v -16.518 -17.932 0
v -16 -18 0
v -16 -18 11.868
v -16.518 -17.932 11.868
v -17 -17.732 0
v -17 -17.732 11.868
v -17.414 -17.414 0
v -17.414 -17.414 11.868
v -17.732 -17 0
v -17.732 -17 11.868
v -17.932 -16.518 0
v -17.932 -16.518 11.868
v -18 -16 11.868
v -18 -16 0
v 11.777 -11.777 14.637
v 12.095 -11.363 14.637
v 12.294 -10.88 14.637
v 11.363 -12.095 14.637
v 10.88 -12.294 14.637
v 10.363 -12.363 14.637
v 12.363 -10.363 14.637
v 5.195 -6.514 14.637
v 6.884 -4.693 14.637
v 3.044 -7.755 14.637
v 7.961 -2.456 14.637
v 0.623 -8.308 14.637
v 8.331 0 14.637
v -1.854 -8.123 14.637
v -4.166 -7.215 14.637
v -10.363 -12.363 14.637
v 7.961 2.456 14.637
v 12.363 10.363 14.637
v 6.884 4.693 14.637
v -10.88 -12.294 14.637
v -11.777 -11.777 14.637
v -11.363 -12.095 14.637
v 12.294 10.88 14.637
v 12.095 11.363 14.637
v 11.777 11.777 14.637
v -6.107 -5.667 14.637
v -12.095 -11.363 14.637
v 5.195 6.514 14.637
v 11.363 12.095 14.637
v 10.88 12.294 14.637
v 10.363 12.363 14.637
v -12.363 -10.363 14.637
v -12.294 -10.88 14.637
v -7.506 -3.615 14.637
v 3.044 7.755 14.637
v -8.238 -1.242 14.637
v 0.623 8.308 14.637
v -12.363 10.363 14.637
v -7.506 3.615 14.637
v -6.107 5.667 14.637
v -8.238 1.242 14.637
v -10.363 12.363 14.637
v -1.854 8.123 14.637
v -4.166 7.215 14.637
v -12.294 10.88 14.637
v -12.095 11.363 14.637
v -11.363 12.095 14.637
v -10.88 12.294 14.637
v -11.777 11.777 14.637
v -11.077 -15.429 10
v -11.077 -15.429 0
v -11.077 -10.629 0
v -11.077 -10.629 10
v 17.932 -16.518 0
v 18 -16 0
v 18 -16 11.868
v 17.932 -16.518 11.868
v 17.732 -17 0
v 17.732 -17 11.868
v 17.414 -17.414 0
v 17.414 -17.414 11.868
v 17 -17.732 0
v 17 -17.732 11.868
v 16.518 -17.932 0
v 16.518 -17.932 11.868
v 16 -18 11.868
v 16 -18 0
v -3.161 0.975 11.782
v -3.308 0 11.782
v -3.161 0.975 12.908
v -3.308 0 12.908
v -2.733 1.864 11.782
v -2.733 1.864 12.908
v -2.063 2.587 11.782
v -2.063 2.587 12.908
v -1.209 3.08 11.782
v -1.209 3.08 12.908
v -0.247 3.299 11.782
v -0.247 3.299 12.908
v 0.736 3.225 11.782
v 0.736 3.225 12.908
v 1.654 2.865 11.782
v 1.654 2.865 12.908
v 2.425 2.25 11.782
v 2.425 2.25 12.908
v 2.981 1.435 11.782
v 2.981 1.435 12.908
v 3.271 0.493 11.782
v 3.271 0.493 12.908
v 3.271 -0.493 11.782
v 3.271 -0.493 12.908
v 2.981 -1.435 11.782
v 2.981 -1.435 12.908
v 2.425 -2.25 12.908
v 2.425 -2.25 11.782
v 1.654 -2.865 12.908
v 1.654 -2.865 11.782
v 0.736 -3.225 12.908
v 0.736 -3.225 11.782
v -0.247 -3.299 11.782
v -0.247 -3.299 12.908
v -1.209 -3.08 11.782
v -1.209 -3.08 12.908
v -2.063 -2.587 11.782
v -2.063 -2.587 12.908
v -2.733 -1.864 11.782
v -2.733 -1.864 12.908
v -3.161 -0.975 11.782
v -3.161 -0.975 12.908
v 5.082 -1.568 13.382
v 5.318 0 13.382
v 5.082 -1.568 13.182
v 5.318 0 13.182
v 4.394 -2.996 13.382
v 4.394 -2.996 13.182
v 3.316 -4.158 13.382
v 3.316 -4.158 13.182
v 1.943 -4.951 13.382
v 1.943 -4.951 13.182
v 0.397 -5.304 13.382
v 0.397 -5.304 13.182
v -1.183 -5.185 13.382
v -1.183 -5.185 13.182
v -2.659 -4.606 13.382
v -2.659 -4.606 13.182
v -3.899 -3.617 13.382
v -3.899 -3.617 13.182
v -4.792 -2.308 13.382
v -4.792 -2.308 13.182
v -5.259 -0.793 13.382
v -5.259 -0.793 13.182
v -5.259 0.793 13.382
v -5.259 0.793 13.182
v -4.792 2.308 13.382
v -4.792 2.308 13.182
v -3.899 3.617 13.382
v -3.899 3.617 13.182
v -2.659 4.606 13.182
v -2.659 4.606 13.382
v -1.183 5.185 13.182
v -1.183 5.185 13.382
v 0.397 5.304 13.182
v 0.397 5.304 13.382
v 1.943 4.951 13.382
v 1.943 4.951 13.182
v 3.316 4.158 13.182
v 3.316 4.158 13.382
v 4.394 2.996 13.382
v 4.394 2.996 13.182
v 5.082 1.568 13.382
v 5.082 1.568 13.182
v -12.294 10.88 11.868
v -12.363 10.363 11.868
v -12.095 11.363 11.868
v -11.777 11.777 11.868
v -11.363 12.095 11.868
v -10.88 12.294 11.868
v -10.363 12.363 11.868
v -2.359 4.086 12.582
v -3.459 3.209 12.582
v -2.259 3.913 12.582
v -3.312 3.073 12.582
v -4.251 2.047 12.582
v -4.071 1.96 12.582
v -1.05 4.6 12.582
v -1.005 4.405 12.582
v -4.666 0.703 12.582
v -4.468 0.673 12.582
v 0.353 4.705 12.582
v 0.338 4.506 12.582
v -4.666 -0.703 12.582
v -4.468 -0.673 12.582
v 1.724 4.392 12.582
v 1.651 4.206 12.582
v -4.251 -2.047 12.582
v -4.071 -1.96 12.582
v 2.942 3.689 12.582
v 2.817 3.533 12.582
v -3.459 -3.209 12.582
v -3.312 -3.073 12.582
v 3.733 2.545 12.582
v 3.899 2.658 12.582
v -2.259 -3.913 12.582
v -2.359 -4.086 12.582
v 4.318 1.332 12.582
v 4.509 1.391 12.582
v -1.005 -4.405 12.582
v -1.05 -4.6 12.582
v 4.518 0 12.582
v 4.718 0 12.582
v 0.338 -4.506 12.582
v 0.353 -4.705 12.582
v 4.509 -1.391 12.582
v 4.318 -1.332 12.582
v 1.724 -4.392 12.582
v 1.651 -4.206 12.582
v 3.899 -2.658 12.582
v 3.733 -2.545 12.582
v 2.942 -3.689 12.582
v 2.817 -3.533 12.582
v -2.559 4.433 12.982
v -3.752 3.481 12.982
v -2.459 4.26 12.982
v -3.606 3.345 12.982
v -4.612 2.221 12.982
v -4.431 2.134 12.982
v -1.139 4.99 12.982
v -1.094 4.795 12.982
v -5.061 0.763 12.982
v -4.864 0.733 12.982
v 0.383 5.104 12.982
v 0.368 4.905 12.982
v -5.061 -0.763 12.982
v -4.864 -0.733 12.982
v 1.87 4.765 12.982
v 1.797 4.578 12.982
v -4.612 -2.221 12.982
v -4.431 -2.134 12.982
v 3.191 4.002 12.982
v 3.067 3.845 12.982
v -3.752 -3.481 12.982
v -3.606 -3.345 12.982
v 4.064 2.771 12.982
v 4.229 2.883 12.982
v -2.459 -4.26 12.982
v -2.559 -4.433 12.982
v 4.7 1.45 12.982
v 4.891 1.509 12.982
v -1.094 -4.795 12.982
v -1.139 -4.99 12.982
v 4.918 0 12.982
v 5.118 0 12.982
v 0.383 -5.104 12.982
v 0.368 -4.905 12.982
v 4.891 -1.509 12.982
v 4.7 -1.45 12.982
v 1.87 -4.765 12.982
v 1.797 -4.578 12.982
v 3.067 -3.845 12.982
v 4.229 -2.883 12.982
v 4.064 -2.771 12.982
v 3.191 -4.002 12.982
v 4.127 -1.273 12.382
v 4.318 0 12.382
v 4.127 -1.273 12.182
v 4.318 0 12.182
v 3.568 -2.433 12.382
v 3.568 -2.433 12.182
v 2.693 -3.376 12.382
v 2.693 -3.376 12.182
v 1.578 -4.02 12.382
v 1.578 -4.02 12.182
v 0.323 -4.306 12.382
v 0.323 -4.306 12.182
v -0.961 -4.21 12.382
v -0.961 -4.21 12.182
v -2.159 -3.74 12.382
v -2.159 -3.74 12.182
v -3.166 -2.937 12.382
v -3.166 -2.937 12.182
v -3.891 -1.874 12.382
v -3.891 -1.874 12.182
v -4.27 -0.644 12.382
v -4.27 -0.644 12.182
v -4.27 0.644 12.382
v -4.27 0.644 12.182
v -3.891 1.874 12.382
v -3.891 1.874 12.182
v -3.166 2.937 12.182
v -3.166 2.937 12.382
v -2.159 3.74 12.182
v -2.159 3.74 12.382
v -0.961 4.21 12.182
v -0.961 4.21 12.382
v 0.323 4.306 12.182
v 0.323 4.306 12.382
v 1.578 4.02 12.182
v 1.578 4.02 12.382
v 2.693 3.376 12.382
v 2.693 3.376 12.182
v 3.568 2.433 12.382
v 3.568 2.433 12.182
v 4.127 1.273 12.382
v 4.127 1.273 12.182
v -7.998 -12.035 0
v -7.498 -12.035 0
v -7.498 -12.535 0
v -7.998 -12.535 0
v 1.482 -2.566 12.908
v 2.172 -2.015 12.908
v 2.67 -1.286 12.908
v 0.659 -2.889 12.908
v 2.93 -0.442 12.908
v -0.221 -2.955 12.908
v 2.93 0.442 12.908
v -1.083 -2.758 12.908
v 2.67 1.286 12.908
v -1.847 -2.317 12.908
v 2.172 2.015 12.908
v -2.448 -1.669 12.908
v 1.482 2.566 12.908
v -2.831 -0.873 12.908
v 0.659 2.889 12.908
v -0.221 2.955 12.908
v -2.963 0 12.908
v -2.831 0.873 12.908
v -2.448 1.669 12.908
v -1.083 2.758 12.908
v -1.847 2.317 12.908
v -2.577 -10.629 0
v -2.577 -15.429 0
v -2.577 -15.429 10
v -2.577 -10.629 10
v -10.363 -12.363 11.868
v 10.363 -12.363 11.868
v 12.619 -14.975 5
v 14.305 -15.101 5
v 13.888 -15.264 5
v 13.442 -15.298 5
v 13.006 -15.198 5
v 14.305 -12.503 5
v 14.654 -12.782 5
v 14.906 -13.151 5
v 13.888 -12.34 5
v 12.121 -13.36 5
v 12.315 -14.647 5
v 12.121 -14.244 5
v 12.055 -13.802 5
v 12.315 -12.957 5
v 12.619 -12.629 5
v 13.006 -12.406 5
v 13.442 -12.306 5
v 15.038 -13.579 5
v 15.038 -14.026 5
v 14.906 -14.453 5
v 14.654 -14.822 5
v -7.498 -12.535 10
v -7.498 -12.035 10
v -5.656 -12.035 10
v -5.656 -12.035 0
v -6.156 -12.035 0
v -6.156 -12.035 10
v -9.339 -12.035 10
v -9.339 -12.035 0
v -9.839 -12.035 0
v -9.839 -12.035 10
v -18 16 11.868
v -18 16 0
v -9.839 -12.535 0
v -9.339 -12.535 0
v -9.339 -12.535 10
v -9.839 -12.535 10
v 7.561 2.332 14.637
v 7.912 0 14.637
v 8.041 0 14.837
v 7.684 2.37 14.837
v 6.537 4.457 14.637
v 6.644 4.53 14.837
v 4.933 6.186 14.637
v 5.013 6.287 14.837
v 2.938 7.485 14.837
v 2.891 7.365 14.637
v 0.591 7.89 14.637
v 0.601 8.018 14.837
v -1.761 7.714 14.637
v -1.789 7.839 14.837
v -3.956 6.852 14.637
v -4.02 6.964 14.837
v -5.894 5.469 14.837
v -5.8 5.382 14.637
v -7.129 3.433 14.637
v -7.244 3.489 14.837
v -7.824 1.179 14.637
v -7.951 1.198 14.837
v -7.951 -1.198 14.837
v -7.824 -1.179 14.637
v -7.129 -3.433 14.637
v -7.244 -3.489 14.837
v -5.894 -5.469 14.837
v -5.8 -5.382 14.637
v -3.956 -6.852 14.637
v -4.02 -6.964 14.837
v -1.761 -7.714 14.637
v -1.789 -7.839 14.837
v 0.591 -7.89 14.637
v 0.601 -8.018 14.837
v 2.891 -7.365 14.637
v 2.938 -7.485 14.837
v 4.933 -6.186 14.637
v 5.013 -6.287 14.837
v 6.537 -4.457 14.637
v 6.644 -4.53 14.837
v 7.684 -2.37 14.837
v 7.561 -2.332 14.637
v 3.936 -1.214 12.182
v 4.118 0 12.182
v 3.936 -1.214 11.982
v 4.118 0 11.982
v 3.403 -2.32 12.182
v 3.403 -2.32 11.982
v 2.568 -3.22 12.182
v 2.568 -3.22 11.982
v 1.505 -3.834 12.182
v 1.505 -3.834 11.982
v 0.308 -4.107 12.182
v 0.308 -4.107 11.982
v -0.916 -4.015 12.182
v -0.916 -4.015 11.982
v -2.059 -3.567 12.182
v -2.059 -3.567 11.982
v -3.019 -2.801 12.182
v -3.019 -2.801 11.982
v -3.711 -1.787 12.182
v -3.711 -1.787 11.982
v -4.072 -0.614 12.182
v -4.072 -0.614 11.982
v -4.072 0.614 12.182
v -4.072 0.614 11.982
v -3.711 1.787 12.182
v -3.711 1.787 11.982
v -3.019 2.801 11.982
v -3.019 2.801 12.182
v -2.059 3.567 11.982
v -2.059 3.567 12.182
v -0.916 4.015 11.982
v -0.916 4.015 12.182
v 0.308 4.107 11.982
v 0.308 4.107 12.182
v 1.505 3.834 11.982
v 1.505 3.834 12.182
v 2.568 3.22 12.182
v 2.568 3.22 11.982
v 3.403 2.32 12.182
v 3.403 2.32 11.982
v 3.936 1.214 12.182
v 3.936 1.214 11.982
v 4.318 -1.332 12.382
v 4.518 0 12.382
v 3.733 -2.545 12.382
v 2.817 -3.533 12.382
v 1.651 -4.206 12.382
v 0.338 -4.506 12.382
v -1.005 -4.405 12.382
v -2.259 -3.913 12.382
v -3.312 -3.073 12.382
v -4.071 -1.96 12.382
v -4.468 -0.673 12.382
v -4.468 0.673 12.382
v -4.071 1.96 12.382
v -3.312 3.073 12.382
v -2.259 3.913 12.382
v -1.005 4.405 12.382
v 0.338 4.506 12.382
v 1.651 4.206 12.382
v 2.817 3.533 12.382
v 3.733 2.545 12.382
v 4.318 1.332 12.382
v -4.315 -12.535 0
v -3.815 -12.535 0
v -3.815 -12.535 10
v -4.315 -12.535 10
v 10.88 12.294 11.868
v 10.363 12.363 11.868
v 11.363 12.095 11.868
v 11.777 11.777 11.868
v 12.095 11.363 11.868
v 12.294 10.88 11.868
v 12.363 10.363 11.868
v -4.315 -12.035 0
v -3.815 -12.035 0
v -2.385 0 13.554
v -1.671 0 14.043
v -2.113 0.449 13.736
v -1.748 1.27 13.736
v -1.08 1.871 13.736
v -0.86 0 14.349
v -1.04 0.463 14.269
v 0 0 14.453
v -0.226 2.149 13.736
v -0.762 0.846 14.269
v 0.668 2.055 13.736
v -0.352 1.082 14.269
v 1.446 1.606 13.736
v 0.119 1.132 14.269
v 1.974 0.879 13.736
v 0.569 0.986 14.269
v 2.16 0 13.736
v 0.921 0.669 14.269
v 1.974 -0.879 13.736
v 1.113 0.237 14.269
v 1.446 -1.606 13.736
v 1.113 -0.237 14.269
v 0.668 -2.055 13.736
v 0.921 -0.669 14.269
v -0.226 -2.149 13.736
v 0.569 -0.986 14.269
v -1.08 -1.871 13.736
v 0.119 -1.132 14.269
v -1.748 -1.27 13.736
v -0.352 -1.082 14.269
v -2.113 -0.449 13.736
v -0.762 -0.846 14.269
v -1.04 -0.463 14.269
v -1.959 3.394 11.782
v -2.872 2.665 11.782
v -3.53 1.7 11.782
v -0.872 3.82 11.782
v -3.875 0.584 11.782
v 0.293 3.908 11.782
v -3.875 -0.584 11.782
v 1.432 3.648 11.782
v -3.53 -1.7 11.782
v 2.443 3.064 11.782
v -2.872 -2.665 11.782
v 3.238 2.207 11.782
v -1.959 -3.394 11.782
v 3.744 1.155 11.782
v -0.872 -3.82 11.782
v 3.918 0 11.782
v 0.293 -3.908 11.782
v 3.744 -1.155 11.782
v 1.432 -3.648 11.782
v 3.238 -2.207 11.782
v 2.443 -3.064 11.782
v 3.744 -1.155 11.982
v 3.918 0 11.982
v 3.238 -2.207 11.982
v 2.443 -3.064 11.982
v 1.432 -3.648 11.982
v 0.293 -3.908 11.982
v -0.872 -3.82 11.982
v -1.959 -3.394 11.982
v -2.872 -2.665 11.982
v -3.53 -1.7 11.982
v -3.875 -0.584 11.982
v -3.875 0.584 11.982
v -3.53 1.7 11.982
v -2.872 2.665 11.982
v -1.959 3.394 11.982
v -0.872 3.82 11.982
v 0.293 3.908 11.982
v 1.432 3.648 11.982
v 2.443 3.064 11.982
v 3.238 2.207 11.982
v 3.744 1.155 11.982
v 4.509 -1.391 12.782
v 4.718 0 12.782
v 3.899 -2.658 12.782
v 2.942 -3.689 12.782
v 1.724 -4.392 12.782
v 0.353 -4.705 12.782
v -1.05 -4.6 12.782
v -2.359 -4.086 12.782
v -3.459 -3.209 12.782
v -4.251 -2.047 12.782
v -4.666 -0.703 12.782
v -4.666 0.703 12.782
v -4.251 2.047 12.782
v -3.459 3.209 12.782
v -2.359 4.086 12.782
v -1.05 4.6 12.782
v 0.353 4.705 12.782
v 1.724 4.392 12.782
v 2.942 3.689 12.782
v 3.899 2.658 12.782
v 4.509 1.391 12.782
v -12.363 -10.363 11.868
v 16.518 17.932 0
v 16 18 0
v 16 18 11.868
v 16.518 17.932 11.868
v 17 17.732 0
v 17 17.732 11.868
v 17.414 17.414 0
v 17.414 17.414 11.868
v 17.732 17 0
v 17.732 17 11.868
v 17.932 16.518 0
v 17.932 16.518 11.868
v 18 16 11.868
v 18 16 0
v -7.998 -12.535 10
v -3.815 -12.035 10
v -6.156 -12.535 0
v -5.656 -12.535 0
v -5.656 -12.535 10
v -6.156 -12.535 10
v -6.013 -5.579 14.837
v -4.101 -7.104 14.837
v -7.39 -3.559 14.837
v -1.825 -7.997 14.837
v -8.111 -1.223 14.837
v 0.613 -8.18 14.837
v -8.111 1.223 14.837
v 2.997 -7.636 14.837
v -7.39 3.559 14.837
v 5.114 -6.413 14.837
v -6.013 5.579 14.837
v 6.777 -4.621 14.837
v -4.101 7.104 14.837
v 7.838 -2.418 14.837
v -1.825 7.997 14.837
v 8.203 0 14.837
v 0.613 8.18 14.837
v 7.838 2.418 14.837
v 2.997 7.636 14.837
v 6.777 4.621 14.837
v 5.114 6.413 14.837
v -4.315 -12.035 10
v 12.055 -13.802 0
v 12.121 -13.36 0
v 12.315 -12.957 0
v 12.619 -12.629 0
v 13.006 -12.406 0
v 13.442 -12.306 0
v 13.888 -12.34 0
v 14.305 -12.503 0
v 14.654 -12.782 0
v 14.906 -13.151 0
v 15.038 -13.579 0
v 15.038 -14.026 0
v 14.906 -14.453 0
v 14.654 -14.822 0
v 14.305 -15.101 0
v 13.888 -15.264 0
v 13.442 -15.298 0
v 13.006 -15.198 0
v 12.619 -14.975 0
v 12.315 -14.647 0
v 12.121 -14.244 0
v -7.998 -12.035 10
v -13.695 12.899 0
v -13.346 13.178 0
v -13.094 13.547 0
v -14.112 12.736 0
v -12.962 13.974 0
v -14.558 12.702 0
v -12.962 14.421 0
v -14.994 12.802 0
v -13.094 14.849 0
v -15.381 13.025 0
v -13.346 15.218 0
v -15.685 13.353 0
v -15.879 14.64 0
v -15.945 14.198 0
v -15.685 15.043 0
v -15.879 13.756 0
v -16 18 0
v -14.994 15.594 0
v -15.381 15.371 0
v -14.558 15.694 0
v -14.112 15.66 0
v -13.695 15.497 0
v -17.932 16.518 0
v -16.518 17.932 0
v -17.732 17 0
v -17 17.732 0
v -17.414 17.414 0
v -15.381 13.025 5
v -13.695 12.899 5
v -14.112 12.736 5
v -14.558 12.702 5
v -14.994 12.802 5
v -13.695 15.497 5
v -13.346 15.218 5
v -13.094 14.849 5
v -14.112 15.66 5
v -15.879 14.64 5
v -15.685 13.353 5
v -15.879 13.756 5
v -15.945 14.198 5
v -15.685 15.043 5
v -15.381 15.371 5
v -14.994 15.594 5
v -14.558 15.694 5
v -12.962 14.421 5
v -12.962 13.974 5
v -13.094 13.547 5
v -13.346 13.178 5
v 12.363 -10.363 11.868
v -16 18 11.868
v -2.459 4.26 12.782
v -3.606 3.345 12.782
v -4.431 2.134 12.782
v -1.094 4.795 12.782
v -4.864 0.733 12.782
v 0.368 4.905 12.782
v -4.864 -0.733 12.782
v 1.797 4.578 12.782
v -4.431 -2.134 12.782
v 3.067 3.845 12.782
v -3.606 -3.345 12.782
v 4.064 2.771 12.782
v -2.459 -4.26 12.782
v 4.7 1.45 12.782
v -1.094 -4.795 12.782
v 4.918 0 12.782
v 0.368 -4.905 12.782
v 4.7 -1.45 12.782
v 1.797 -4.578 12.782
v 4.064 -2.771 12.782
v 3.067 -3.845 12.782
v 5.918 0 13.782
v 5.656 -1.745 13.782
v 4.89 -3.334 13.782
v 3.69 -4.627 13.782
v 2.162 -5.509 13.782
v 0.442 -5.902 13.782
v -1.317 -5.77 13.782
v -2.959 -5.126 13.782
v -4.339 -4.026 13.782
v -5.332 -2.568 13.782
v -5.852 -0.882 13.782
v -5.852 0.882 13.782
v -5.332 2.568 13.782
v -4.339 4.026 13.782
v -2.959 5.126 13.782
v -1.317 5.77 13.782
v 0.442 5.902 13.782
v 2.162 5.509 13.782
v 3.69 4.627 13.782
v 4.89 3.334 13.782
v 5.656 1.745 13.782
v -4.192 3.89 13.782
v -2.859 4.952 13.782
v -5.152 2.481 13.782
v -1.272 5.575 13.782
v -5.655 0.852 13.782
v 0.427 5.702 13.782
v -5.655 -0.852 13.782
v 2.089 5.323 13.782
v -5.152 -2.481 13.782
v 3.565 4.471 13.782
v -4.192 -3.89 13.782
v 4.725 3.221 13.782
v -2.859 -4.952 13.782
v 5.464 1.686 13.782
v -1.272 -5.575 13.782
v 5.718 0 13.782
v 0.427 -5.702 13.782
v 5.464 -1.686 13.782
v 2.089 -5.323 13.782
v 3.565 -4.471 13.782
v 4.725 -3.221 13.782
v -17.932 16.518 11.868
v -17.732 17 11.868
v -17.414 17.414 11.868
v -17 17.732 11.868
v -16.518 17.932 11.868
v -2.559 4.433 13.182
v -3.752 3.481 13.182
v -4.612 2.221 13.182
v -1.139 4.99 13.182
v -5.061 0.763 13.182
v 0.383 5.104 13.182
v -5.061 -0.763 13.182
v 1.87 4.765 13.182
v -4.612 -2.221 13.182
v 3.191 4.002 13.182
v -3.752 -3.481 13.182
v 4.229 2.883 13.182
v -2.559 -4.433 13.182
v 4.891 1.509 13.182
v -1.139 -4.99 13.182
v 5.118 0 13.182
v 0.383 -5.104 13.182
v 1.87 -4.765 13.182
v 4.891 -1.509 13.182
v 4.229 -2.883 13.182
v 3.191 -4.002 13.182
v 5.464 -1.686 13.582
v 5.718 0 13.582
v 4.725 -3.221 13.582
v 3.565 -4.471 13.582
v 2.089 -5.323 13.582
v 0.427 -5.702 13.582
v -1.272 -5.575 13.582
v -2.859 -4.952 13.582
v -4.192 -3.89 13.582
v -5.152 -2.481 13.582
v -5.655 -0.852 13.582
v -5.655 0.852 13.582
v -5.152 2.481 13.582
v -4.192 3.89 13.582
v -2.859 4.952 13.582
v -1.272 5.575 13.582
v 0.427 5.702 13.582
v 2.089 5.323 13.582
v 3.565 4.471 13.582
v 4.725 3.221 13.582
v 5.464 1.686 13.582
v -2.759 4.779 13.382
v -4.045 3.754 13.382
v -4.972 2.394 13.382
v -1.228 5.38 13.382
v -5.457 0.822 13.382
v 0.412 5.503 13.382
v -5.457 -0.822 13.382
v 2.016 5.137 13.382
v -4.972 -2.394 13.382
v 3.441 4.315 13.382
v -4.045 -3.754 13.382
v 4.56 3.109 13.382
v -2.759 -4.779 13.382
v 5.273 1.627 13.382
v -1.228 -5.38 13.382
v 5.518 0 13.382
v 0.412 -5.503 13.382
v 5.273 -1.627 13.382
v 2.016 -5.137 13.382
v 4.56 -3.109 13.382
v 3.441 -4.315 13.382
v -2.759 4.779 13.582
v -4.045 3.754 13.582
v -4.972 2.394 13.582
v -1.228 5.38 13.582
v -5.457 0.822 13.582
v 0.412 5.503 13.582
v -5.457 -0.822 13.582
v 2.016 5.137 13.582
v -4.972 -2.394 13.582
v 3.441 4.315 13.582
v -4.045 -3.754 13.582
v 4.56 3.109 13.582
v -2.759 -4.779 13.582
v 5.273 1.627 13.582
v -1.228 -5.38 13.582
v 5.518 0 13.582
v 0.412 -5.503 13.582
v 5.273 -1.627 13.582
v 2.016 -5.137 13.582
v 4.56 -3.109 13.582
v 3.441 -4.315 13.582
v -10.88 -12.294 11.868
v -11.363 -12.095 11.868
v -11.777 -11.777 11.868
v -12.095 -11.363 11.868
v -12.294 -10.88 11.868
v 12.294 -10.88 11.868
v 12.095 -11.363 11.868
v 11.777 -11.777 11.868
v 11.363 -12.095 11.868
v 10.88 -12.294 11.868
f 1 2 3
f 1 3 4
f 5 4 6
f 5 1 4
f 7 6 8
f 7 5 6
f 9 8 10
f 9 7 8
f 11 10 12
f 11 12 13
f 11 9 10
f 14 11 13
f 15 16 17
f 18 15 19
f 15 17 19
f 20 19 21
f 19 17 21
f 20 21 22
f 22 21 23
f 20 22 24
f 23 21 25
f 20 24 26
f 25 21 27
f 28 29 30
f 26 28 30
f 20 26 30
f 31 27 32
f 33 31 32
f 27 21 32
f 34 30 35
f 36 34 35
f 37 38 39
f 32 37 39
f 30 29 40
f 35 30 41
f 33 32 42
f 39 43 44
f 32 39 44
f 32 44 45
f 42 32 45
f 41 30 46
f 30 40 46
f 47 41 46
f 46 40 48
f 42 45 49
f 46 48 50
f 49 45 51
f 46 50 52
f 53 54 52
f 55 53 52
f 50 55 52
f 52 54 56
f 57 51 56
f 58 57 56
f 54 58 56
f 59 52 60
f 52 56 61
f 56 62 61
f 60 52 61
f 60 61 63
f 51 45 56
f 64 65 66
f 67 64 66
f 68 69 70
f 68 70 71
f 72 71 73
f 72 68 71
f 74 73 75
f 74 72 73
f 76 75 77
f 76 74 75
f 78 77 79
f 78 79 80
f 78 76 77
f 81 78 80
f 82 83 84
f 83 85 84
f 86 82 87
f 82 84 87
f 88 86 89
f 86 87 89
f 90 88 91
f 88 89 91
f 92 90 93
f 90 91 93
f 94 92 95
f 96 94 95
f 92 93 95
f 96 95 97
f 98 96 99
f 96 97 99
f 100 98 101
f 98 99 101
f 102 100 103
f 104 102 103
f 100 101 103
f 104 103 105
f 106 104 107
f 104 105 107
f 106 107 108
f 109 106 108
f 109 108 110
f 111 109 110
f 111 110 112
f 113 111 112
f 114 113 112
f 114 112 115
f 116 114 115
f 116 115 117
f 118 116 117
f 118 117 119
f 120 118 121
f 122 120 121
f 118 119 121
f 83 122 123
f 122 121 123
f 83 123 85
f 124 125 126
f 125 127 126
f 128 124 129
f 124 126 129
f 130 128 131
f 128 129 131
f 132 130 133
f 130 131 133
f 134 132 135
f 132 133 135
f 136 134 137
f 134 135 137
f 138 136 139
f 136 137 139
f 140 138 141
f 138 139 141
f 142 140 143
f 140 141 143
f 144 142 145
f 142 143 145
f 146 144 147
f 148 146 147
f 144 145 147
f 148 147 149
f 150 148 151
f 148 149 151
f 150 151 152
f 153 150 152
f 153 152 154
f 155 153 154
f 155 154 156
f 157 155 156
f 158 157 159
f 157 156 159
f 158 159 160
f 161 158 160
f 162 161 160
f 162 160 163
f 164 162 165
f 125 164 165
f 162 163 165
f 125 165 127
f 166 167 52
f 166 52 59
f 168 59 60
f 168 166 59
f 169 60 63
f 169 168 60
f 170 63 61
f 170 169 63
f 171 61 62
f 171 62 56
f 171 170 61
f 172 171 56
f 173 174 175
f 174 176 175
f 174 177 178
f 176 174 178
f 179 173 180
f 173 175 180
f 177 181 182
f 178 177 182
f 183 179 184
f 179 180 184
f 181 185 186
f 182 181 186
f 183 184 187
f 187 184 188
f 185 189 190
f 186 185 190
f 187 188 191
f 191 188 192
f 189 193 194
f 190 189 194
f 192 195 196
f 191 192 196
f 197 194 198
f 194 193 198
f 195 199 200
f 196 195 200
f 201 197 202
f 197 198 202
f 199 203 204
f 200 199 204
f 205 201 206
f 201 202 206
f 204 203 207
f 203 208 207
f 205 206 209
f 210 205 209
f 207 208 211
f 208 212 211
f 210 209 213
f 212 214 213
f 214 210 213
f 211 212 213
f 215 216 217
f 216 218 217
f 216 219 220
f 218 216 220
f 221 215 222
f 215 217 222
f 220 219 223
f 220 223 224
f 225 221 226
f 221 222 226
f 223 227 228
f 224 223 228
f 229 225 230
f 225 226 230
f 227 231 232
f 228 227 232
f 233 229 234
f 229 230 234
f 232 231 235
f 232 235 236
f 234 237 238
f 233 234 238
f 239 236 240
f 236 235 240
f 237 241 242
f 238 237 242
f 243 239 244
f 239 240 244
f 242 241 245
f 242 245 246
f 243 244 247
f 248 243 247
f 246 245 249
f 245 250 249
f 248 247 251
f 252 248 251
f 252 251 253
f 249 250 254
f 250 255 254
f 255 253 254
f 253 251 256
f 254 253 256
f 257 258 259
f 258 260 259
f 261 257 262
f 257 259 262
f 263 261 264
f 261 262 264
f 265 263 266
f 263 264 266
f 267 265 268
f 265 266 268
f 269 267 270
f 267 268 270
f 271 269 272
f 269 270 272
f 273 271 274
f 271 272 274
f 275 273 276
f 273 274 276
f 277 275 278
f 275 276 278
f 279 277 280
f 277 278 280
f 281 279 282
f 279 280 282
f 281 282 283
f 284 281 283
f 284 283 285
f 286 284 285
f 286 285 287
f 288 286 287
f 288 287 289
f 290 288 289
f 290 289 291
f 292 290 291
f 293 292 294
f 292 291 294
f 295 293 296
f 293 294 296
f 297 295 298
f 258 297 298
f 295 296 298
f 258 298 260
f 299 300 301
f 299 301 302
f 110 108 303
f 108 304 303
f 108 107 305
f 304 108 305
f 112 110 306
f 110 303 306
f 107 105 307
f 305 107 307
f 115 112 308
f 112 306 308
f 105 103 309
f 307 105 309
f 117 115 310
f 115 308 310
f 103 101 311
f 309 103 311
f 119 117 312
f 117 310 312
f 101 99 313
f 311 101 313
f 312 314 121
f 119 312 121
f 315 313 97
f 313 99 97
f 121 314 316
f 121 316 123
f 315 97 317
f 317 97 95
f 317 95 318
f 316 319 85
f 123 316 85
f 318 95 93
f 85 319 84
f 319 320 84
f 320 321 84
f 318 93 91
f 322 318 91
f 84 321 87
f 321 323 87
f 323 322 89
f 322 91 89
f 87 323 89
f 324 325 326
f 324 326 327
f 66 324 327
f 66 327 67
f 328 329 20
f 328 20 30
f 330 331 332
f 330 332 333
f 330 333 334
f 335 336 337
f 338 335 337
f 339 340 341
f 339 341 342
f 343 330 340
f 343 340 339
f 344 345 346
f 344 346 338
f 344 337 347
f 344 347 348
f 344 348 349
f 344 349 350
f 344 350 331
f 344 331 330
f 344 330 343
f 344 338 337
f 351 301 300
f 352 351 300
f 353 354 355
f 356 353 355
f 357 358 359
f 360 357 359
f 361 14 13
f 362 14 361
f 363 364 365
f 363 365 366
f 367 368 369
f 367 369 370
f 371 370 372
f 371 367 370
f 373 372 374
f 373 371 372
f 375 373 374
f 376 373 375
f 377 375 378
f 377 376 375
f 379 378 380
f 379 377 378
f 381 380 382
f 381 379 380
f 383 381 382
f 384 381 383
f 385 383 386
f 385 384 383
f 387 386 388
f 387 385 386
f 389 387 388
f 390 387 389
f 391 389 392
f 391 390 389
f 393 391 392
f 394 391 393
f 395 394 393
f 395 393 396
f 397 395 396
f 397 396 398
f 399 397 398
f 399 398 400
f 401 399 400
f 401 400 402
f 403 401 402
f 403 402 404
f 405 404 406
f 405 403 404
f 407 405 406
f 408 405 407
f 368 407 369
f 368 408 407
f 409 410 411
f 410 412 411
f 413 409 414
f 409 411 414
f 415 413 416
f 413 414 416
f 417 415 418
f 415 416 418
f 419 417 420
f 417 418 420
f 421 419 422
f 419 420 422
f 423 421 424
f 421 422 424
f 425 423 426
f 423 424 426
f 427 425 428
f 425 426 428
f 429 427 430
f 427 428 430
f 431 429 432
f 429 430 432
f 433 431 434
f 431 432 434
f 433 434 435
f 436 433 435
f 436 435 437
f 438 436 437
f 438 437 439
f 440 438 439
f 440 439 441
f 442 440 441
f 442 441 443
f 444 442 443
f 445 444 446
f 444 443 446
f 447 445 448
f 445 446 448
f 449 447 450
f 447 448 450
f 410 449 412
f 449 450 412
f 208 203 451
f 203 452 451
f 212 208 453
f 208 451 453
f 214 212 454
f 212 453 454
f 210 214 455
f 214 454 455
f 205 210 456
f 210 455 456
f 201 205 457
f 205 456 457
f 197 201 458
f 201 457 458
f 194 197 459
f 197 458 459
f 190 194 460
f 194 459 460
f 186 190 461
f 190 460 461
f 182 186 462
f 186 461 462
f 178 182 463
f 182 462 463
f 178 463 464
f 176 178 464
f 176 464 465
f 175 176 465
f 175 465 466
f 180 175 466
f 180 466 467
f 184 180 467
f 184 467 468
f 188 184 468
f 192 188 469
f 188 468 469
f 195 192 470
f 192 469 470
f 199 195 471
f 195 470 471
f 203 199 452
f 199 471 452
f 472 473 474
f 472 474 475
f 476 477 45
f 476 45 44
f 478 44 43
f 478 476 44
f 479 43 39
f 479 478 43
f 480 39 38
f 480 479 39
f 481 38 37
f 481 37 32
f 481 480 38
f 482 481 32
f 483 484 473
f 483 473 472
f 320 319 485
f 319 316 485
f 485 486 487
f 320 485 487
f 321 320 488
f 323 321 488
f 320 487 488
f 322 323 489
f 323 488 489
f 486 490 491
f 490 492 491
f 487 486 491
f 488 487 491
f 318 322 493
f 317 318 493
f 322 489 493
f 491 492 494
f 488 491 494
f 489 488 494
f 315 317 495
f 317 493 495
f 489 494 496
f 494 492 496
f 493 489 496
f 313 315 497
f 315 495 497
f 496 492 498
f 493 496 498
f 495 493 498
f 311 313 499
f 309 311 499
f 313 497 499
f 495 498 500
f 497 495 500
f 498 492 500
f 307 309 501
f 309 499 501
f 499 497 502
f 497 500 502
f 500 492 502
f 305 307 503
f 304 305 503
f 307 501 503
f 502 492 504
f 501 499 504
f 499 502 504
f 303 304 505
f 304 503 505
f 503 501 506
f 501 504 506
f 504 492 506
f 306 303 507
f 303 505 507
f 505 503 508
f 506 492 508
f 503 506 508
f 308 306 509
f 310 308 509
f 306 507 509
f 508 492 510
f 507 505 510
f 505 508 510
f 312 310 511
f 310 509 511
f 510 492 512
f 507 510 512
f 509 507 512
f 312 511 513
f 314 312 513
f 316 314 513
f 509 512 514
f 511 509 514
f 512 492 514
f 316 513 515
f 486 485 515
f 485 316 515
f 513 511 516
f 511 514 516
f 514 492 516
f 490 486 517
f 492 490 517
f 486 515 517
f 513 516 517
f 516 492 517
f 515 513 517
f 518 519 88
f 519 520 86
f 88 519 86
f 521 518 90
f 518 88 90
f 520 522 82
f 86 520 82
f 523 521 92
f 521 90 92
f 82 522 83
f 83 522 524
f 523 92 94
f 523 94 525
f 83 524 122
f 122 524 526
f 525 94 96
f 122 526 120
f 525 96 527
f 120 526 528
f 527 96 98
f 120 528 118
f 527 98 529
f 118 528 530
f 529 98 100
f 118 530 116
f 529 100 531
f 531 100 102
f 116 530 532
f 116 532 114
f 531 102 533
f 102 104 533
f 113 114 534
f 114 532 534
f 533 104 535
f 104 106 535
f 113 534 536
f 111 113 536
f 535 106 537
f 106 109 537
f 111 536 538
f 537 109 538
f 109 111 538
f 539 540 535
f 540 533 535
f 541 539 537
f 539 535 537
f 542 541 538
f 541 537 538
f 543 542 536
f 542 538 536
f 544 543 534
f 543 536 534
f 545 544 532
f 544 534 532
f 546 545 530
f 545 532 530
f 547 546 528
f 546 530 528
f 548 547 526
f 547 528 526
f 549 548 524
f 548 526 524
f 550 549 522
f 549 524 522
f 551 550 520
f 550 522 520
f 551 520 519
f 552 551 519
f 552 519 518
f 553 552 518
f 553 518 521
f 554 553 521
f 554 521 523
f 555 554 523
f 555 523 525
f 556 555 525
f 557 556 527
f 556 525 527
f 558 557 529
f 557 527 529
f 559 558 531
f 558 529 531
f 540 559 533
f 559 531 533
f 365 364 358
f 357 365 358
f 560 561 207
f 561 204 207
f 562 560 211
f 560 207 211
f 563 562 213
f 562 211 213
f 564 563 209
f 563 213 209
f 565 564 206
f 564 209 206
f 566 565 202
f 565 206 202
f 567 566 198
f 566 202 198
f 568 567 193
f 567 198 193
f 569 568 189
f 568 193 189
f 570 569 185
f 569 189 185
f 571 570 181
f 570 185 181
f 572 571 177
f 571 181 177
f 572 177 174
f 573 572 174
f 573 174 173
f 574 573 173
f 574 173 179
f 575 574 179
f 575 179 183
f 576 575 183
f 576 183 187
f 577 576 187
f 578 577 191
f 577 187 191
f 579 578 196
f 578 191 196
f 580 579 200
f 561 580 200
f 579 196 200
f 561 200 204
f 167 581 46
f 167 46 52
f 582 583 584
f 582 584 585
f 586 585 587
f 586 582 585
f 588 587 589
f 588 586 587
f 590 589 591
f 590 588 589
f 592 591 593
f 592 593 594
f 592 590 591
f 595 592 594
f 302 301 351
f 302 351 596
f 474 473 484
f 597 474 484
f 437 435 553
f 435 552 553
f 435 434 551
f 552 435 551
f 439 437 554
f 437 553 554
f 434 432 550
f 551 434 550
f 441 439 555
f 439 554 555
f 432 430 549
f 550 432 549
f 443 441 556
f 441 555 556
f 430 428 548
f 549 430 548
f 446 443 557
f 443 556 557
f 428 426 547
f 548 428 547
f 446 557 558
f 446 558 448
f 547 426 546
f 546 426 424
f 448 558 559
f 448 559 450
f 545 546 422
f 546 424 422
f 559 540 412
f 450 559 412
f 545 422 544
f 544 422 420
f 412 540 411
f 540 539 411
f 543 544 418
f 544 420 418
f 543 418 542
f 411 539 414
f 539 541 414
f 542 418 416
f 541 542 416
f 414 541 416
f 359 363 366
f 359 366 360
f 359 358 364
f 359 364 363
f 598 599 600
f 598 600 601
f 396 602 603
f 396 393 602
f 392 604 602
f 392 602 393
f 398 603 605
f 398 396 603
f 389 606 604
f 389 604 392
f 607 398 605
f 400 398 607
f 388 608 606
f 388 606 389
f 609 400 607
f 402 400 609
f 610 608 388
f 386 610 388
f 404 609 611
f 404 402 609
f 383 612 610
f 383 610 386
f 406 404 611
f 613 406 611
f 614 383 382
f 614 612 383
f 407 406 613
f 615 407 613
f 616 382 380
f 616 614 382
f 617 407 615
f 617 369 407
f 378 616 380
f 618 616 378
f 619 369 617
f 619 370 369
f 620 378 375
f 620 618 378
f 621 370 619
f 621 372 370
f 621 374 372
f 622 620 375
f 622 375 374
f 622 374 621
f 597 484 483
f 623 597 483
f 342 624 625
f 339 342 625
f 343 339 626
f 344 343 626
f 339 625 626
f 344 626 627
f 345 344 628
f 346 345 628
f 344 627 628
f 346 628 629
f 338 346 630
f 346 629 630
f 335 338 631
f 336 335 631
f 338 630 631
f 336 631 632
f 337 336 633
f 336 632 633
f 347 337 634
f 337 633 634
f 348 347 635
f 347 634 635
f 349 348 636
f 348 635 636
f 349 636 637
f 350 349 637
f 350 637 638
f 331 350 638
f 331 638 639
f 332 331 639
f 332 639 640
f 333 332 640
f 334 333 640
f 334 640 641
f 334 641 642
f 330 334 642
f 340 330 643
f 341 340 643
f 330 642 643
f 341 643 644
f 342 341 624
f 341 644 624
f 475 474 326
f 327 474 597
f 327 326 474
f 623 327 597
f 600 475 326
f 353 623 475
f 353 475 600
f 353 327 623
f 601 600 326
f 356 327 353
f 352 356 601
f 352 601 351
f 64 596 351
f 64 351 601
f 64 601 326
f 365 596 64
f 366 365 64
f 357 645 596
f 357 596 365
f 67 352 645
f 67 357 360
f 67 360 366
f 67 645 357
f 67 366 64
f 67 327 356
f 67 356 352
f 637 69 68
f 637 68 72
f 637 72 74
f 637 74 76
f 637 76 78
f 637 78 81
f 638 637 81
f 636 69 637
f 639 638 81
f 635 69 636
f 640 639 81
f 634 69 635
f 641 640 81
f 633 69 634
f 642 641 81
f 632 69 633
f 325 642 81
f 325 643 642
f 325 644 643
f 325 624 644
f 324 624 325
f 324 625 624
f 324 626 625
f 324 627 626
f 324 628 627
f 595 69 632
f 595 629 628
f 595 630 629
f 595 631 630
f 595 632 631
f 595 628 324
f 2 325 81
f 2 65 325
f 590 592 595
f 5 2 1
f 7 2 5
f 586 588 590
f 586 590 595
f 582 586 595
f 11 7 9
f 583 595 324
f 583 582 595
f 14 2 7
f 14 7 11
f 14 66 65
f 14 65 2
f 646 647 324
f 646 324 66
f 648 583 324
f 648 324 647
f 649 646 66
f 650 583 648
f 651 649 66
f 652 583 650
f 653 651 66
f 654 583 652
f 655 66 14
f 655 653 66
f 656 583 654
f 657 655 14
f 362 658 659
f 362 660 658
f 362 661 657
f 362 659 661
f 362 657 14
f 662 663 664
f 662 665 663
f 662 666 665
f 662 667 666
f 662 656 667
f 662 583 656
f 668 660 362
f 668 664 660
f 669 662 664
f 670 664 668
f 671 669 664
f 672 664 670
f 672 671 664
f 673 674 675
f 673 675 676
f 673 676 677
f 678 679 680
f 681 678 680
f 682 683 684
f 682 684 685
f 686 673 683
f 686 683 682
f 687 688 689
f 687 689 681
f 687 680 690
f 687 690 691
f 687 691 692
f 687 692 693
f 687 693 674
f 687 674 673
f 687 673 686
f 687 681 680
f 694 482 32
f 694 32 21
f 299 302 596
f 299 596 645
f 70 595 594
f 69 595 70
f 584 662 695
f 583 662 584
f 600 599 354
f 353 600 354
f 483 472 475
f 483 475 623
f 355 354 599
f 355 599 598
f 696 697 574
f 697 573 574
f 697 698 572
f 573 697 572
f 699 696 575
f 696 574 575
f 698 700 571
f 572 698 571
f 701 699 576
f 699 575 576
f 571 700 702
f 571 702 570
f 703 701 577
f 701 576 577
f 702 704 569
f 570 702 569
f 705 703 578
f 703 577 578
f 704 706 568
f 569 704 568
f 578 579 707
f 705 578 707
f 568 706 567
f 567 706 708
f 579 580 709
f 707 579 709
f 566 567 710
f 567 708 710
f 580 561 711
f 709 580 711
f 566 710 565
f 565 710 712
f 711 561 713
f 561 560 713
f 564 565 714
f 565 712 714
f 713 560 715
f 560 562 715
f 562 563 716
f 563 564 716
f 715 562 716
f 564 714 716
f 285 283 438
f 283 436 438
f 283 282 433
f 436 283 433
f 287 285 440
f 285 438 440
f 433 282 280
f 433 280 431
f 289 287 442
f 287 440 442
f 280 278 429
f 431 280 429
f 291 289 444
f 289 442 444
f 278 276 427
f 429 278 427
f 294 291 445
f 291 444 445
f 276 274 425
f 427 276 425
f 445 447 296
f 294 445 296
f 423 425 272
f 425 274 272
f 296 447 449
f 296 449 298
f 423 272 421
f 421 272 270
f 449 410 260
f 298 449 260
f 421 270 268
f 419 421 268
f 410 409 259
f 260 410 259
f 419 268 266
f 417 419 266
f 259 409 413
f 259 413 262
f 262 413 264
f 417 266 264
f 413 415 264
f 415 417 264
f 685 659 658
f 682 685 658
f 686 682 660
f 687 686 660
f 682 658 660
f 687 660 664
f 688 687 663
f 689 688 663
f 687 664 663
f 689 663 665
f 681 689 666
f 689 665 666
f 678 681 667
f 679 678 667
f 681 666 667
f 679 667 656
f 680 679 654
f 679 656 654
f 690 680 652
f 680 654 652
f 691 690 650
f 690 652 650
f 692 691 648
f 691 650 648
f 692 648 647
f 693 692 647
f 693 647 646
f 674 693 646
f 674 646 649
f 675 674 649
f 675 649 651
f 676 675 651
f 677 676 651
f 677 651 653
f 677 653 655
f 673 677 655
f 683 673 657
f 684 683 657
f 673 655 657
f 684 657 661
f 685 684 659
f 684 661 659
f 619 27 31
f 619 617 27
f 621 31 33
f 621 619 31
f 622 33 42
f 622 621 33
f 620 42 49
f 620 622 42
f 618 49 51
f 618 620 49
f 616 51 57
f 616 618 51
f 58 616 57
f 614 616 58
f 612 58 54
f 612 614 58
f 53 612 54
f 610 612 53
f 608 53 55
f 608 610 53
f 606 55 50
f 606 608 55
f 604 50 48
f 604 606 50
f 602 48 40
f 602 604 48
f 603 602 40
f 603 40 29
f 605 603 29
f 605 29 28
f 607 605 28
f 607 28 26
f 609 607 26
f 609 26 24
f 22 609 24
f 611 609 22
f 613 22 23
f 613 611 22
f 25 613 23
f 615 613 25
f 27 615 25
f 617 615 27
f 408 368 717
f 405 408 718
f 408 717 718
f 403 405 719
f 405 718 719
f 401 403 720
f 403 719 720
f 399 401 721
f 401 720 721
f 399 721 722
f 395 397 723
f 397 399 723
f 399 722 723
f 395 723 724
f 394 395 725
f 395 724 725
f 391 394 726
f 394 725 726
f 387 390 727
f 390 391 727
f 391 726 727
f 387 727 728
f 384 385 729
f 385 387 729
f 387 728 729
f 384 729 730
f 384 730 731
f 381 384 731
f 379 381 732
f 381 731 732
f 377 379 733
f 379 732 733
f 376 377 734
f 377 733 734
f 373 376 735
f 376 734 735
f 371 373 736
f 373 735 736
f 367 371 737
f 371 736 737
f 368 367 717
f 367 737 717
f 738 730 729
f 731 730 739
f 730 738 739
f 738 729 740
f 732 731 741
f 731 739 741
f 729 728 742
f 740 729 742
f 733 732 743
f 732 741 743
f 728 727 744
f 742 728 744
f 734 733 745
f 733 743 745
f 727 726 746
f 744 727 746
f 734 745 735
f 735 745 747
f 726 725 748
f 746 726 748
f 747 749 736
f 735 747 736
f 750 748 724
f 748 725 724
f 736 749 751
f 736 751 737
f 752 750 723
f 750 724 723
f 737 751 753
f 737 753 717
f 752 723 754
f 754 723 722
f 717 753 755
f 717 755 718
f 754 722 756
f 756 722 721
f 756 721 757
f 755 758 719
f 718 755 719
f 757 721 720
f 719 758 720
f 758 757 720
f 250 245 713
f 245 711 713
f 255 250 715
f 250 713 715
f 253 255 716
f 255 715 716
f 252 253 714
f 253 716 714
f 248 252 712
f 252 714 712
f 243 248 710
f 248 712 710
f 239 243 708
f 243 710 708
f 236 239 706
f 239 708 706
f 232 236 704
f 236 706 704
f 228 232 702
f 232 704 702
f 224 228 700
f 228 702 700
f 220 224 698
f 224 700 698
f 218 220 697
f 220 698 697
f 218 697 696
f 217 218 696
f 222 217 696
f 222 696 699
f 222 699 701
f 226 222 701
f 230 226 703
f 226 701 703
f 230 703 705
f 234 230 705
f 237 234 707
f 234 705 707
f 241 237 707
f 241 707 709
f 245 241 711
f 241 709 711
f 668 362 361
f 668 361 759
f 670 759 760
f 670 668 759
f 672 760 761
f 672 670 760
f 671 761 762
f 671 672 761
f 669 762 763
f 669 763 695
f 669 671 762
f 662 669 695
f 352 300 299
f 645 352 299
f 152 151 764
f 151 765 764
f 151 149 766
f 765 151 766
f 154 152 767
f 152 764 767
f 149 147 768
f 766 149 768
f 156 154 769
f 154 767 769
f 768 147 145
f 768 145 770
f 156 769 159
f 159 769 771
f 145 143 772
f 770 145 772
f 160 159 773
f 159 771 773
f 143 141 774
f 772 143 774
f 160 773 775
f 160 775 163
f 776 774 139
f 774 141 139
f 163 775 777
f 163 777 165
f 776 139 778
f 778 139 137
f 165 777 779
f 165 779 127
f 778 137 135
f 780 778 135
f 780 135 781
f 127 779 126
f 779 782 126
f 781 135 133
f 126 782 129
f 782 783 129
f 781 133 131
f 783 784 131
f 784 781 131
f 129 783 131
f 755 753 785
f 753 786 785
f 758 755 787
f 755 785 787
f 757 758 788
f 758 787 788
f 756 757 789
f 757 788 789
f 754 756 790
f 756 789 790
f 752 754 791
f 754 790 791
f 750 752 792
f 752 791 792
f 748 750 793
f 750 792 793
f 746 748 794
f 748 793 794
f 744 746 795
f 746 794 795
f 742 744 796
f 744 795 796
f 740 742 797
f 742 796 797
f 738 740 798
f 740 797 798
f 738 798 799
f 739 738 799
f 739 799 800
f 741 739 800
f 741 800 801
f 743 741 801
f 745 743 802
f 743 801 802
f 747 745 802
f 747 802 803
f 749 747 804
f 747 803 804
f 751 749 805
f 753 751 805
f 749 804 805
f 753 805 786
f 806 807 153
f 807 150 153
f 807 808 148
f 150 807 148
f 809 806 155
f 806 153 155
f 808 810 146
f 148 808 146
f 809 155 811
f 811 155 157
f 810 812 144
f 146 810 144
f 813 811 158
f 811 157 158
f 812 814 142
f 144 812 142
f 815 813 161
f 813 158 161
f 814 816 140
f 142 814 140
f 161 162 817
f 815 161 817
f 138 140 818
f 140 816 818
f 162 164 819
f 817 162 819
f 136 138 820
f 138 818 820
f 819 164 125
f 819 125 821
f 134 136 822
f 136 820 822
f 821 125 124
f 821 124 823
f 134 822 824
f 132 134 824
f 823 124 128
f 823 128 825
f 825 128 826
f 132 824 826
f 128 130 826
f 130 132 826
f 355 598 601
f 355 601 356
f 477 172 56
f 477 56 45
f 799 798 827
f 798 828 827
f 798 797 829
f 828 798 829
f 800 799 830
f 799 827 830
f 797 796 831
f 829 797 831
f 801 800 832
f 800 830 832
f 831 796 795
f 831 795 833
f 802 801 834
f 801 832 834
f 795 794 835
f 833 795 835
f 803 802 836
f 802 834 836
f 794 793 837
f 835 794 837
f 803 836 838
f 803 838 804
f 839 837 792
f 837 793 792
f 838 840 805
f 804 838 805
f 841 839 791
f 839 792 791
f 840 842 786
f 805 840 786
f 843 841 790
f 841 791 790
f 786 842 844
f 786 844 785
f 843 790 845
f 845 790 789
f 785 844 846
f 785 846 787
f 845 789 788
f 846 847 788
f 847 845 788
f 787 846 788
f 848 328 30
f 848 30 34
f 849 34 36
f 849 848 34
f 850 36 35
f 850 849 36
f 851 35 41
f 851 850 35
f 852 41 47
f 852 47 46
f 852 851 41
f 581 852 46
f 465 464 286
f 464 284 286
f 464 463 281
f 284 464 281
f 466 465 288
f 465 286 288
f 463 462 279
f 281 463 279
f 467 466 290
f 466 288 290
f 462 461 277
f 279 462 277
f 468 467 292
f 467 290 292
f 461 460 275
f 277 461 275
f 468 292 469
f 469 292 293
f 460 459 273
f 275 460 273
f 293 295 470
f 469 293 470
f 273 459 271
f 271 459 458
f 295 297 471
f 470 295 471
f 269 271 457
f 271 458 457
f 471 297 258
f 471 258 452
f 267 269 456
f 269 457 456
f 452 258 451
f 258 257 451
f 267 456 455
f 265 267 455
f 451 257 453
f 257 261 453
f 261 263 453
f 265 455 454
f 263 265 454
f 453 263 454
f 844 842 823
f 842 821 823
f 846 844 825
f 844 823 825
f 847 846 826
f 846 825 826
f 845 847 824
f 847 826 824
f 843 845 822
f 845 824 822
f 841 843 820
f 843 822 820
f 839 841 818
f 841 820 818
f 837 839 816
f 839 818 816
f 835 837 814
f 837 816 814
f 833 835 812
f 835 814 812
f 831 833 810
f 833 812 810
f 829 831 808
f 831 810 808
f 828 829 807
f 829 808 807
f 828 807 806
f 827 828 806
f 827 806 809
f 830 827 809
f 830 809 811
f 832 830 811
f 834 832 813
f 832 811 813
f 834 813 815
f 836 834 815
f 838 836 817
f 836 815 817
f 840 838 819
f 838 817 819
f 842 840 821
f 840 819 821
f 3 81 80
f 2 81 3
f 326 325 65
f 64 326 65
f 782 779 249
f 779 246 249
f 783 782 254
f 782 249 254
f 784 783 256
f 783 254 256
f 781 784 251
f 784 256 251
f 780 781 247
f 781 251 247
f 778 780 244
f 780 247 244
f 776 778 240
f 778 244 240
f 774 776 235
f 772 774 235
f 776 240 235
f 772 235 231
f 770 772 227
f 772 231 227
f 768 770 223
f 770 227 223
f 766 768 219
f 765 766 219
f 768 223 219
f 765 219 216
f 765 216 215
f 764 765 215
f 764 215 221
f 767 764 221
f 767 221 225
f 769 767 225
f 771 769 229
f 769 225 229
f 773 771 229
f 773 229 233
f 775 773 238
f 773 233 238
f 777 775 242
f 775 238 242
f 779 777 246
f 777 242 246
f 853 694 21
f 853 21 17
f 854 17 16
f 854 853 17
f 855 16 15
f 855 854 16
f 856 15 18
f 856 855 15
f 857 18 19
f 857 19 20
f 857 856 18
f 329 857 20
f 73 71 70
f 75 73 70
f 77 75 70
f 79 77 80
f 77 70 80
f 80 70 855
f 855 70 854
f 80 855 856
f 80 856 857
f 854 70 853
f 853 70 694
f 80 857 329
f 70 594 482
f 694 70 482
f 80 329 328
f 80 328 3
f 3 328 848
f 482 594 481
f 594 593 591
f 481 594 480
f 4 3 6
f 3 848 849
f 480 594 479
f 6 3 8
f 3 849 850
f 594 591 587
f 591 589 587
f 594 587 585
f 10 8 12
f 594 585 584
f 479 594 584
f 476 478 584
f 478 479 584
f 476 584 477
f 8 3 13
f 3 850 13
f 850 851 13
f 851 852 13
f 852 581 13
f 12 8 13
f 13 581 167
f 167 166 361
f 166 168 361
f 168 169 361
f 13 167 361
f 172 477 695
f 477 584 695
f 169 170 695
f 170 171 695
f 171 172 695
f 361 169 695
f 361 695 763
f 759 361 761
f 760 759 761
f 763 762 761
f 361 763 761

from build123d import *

# Parameters (mm, degrees)
BOSS_EXTRUDE1_DEPTH = 11.868131868
SKETCH2_R           = 1.5
CUT_EXTRUDE1_DEPTH  = 5
BOSS_EXTRUDE2_DEPTH = 2.769230769
SKETCH7_W           = 8.5
SKETCH7_H           = 4.8
SKETCH7_W_2         = 0.5
SKETCH7_H_2         = 0.5
CUT_EXTRUDE2_DEPTH  = 10


with BuildPart() as part:
    # Sketch1 → Boss-Extrude1 (new body)
    with BuildSketch(Plane.XY):
        with BuildLine():
            Line((-16, 18), (16, 18))
            ThreePointArc((16, 18), (17.414213562, 17.414213562), (18, 16))
            Line((18, 16), (18, -16))
            ThreePointArc((18, -16), (17.414213562, -17.414213562), (16, -18))
            Line((16, -18), (-16, -18))
            ThreePointArc((-16, -18), (-17.414213562, -17.414213562), (-18, -16))
            Line((-18, -16), (-18, 16))
            ThreePointArc((-18, 16), (-17.414213562, 17.414213562), (-16, 18))
        make_face()
    extrude(amount=BOSS_EXTRUDE1_DEPTH)

    # Sketch2 → Cut-Extrude1 (cut)
    with BuildSketch(Plane(origin=(0, 0, 0), x_dir=(-1, 0, 0), z_dir=(0, 0, -1))):
        with Locations((-13.554503907, -13.802086098)):
            Circle(SKETCH2_R)
        with Locations((14.445496093, 14.197913902)):
            Circle(SKETCH2_R)
    extrude(amount=-CUT_EXTRUDE1_DEPTH, mode=Mode.SUBTRACT)

    # Sketch3 → Boss-Extrude2 (add)
    with BuildSketch(Plane.XY.offset(11.868131868)):
        with BuildLine():
            Line((-10.362637363, 12.362637363), (10.362637363, 12.362637363))
            ThreePointArc((10.362637363, 12.362637363), (11.776850925, 11.776850925), (12.362637363, 10.362637363))
            Line((12.362637363, 10.362637363), (12.362637363, -10.362637363))
            ThreePointArc((12.362637363, -10.362637363), (11.776850925, -11.776850925), (10.362637363, -12.362637363))
            Line((10.362637363, -12.362637363), (-10.362637363, -12.362637363))
            ThreePointArc((-10.362637363, -12.362637363), (-11.776850925, -11.776850925), (-12.362637363, -10.362637363))
            Line((-12.362637363, -10.362637363), (-12.362637363, 10.362637363))
            ThreePointArc((-12.362637363, 10.362637363), (-11.776850925, 11.776850925), (-10.362637363, 12.362637363))
        make_face()
    extrude(amount=BOSS_EXTRUDE2_DEPTH)

    # Sketch4 → Revolve1 (revolve)
    with BuildSketch(Plane(origin=(0, 0, 0), x_dir=(1, 0, 0), z_dir=(0, 1, 0)), mode=Mode.PRIVATE) as revolve1_sk:
        Polygon((-8.33139296, -14.637362637), (-8.202720326, -14.837362637), (-8.040760547, -14.837362637), (-7.912087912, -14.637362637), align=None)
    revolve(revolve1_sk.sketch.rotate(Axis((0, 0, 15.476177455), (0, 0, 1)), 180), axis=Axis((0, 0, 15.476177455), (0, 0, 1)))

    # Sketch5 → Cut-Revolve1 (revolve, cut)
    with BuildSketch(Plane(origin=(0, 0, 0), x_dir=(1, 0, 0), z_dir=(0, 1, 0)), mode=Mode.PRIVATE) as cut_revolve1_sk:
        Polygon((-7.912087912, -14.637362637), (-5.918480504, -13.782101407), (-5.718480504, -13.782101407), (-5.718480504, -13.582101407), (-5.518480504, -13.582101407), (-5.518480504, -13.382101407), (-5.318480504, -13.382101407), (-5.318480504, -13.182101407), (-5.118480504, -13.182101407), (-5.118480504, -12.982101407), (-4.918480504, -12.982101407), (-4.918480504, -12.782101407), (-4.718480504, -12.782101407), (-4.718480504, -12.582101407), (-4.518480504, -12.582101407), (-4.518480504, -12.382101407), (-4.318480504, -12.382101407), (-4.318480504, -12.182101407), (-4.118480504, -12.182101407), (-4.118480504, -11.982101407), (-3.918480504, -11.982101407), (-3.918480504, -11.782101407), (0, -11.782101407), (0, -14.637362637), align=None)
    revolve(cut_revolve1_sk.sketch.rotate(Axis((0, 0, 19.146341311), (0, 0, -1)), 180), axis=Axis((0, 0, 19.146341311), (0, 0, -1)), mode=Mode.SUBTRACT)

    # Sketch6 → Revolve2 (revolve)
    with BuildSketch(Plane(origin=(0, 0, 0), x_dir=(1, 0, 0), z_dir=(0, 1, 0))):
        with BuildLine():
            Line((-3.308329692, -11.782101407), (-3.308329692, -12.908378043))
            Line((-3.308329692, -12.908378043), (-2.963068503, -12.908378043))
            ThreePointArc((-2.963068503, -12.908378043), (-1.670669607, -14.043416814), (0, -14.452649))
            Line((0, -14.452649), (0, -11.782101407))
            Line((0, -11.782101407), (-3.308329692, -11.782101407))
        make_face()
    revolve(axis=Axis((0, 0, 14.452649), (0, 0, -1)))

    # Sketch7 → Cut-Extrude2 (cut)
    with BuildSketch(Plane(origin=(0, 0, 0), x_dir=(-1, 0, 0), z_dir=(0, 0, -1))):
        with Locations((6.826923077, -13.028571429)):
            Rectangle(SKETCH7_W, SKETCH7_H)
        with Locations((4.064707138, -12.284956035)):
            Rectangle(SKETCH7_W_2, SKETCH7_H_2, mode=Mode.SUBTRACT)
        with Locations((5.906184431, -12.284956035)):
            Rectangle(SKETCH7_W_2, SKETCH7_H_2, mode=Mode.SUBTRACT)
        with Locations((7.747661723, -12.284956035)):
            Rectangle(SKETCH7_W_2, SKETCH7_H_2, mode=Mode.SUBTRACT)
        with Locations((9.589139016, -12.284956035)):
            Rectangle(SKETCH7_W_2, SKETCH7_H_2, mode=Mode.SUBTRACT)
    extrude(amount=-CUT_EXTRUDE2_DEPTH, mode=Mode.SUBTRACT)


solid = part.part
